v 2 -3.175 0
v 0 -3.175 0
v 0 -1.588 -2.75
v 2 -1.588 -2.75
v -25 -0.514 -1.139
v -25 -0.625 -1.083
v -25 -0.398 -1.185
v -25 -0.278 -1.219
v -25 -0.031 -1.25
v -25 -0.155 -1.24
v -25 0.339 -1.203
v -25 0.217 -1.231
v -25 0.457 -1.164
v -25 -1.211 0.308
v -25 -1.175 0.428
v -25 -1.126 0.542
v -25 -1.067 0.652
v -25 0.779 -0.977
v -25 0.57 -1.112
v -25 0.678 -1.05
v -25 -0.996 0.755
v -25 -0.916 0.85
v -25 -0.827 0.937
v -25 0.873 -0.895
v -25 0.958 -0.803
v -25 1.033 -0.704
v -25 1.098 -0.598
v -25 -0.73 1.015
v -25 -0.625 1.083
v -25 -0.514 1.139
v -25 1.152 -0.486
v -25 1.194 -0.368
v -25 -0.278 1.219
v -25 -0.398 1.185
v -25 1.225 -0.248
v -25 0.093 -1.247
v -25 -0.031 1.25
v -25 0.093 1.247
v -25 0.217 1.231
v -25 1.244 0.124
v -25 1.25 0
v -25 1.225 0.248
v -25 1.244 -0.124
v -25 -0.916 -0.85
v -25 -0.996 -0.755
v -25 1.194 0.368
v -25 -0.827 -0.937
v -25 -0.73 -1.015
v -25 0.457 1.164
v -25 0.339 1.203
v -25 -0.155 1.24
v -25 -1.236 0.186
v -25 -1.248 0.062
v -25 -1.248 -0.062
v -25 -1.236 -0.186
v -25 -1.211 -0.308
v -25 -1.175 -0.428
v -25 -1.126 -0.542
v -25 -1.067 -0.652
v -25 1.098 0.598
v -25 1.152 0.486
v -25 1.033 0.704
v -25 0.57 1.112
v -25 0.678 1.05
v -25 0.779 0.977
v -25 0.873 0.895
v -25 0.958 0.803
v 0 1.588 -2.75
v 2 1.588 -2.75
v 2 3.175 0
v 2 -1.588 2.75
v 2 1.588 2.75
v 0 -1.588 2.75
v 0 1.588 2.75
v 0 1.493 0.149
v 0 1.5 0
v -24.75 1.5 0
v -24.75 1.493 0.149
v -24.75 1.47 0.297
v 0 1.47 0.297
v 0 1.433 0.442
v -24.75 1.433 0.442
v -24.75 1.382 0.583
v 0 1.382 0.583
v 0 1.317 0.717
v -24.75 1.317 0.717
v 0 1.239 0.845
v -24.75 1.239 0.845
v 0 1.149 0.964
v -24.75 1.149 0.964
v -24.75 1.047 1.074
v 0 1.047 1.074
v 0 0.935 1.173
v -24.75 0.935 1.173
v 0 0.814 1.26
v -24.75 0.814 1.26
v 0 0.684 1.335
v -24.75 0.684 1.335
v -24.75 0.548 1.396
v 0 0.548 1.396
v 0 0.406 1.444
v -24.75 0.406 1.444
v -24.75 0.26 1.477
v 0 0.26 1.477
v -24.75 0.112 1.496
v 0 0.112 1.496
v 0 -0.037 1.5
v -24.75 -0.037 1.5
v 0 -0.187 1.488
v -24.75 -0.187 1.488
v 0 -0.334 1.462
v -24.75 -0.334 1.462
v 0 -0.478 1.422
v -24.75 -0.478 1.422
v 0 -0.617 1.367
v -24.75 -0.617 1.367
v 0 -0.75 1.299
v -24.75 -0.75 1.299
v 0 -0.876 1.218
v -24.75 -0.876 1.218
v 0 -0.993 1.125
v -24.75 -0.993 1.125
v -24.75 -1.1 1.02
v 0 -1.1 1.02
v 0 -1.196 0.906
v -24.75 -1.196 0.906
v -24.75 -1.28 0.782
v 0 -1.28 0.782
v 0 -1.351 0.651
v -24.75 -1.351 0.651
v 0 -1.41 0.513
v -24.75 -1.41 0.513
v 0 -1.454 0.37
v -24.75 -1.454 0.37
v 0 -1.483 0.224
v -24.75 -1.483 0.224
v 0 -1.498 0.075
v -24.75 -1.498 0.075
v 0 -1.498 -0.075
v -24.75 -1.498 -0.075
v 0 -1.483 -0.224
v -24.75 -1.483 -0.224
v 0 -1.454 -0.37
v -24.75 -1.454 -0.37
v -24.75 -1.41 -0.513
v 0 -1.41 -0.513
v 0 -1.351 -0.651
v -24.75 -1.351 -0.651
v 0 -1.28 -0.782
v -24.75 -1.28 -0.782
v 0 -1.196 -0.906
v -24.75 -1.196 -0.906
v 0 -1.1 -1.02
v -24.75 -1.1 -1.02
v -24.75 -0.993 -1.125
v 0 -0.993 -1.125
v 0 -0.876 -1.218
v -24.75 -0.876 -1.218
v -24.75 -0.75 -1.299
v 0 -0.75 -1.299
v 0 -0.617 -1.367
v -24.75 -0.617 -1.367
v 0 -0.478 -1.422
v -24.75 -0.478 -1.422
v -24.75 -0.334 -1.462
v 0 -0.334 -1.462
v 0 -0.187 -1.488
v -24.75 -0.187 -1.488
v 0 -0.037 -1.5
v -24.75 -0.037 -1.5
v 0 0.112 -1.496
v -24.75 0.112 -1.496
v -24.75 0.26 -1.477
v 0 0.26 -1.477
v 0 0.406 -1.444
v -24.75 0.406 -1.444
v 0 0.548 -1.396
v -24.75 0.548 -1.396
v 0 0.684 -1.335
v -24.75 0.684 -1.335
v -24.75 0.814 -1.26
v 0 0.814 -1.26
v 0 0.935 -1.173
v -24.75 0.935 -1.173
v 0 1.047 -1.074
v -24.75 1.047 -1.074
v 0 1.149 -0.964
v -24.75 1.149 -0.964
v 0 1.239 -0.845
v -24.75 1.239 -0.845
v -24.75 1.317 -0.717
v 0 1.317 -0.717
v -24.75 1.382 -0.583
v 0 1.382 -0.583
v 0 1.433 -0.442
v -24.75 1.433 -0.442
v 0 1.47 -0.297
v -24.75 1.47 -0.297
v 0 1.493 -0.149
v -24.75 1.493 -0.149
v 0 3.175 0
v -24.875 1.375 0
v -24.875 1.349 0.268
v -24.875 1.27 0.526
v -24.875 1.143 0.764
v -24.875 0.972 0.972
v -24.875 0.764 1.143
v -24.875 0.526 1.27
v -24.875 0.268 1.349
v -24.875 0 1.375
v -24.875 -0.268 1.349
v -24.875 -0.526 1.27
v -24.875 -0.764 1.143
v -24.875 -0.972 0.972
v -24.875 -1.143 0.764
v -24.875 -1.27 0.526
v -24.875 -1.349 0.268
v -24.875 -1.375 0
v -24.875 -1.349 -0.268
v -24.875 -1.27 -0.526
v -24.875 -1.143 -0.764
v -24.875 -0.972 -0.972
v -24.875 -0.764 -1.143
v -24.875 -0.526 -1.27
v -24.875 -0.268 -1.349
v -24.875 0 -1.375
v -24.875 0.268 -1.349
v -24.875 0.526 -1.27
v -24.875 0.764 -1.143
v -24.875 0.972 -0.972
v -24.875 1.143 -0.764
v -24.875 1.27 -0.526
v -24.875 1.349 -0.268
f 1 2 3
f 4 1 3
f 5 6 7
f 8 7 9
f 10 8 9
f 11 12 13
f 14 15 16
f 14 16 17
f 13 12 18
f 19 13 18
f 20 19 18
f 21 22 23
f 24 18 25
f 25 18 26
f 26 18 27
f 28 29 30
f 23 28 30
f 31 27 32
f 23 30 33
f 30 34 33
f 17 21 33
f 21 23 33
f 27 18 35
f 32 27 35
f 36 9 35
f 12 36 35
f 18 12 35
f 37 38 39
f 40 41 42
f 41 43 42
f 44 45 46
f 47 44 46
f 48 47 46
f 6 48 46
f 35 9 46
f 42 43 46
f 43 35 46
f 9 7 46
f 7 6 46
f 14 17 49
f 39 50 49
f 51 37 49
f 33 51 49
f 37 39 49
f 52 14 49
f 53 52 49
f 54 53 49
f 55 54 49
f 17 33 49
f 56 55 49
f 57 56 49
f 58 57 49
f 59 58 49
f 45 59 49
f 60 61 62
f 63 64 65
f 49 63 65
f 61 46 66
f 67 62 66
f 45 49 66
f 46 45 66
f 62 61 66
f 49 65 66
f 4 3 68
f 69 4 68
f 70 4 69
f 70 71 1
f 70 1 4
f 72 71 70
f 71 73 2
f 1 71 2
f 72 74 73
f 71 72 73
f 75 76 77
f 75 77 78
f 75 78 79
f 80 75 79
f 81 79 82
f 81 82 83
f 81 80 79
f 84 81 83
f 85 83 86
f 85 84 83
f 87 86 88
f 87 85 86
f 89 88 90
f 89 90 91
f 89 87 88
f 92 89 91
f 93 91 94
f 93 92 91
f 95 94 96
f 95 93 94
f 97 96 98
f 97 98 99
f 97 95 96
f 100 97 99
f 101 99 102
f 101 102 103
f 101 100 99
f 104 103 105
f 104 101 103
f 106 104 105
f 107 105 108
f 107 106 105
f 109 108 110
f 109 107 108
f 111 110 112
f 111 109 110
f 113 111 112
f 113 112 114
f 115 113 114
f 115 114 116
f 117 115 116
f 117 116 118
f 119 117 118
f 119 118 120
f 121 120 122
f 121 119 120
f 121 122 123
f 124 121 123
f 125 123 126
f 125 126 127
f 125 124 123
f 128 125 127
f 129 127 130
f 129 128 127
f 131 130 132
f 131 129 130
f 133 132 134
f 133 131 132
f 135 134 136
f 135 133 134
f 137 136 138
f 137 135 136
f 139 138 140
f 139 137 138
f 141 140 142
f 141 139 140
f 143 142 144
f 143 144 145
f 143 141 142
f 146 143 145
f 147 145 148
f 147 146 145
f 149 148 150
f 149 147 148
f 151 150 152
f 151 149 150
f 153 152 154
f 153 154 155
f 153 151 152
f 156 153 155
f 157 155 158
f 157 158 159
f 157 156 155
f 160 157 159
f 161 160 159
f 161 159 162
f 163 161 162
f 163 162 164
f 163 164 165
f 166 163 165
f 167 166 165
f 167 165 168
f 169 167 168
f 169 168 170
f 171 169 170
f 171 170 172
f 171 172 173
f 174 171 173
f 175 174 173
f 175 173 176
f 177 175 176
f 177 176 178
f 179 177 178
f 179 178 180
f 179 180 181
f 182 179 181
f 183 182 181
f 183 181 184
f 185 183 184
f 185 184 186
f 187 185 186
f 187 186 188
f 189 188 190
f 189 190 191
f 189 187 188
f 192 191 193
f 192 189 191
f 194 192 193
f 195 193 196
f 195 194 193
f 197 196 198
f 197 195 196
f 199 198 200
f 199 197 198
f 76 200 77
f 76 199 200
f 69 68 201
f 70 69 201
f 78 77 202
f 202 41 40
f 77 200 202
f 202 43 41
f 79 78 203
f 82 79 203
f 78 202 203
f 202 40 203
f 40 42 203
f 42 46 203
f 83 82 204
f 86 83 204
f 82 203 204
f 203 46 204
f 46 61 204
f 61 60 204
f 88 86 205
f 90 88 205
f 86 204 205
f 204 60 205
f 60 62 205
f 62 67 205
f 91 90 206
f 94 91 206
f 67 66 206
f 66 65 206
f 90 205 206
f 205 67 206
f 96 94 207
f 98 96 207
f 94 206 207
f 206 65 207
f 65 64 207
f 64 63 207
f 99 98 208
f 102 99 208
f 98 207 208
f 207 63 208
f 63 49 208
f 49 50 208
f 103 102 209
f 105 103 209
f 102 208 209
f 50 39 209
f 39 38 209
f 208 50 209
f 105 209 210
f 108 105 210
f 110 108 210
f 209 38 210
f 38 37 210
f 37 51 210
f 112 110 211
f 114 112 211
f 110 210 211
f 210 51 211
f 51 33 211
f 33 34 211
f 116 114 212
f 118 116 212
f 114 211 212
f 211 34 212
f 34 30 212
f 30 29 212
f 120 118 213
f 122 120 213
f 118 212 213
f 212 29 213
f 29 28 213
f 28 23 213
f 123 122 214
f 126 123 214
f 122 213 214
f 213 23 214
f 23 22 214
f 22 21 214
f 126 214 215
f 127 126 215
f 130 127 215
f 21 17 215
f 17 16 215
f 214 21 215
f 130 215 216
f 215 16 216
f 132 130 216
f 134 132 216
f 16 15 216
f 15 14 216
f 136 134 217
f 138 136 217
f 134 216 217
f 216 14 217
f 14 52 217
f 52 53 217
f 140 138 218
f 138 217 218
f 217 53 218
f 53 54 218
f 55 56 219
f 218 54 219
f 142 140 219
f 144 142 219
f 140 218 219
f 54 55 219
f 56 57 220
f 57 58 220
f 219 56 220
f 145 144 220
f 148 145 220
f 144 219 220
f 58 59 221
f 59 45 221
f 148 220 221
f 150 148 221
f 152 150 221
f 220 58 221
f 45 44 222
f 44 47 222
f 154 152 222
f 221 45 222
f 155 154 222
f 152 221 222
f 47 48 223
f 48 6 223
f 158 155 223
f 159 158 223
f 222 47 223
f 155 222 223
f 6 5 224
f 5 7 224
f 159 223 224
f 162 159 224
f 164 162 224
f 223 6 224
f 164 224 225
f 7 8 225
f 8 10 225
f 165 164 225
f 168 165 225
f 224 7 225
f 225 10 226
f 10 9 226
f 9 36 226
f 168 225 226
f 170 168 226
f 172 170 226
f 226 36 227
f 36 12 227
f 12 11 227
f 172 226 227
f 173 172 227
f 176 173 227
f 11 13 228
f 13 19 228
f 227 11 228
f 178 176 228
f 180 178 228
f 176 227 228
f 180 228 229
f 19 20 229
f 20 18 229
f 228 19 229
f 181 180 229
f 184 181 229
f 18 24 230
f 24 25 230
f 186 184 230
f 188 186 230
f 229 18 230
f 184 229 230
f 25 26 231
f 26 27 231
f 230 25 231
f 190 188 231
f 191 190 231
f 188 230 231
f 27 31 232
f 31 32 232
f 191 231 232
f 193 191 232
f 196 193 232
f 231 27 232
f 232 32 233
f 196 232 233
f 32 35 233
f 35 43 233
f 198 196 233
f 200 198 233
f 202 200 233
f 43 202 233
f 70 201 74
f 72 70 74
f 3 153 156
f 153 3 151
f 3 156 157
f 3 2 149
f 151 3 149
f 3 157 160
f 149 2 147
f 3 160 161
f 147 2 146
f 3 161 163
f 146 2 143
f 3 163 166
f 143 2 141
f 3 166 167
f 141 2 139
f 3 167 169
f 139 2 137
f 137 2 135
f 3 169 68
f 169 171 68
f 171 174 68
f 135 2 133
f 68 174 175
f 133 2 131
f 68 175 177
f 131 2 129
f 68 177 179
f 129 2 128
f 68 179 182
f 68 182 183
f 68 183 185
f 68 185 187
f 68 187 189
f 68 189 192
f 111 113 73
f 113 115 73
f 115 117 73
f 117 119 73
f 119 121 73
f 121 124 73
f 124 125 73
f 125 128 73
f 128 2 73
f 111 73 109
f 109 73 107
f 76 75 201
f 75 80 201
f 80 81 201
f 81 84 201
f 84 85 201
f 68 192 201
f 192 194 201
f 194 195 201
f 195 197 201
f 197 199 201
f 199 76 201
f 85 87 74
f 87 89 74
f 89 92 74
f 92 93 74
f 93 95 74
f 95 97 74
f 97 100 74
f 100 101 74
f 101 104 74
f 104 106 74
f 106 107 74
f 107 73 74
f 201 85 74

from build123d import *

# Parameters (mm, degrees)
F1_DEPTH = 2
F2_R     = 1.5
F3_DEPTH = 25
F4_SIZE  = 0.25


with BuildPart() as f1:
    # F0 (on Right) → F1 (new body)
    with BuildSketch(Plane.YZ):
        Polygon((-1.587713, -2.75), (1.587713, -2.75), (3.175426, 0), (1.587713, 2.75), (-1.587713, 2.75), (-3.175426, 0), align=None)
    extrude(amount=F1_DEPTH)

    # F2 (on Right) → F3 (join)
    with BuildSketch(Plane.YZ):
        Circle(F2_R)
    extrude(amount=-F3_DEPTH)

    # F4
    f4_edges = [f1.edges().sort_by_distance(p)[0] for p in [
        (-25, -1.5, 0),
    ]]
    chamfer(f4_edges, length=F4_SIZE)


solid = f1.part
